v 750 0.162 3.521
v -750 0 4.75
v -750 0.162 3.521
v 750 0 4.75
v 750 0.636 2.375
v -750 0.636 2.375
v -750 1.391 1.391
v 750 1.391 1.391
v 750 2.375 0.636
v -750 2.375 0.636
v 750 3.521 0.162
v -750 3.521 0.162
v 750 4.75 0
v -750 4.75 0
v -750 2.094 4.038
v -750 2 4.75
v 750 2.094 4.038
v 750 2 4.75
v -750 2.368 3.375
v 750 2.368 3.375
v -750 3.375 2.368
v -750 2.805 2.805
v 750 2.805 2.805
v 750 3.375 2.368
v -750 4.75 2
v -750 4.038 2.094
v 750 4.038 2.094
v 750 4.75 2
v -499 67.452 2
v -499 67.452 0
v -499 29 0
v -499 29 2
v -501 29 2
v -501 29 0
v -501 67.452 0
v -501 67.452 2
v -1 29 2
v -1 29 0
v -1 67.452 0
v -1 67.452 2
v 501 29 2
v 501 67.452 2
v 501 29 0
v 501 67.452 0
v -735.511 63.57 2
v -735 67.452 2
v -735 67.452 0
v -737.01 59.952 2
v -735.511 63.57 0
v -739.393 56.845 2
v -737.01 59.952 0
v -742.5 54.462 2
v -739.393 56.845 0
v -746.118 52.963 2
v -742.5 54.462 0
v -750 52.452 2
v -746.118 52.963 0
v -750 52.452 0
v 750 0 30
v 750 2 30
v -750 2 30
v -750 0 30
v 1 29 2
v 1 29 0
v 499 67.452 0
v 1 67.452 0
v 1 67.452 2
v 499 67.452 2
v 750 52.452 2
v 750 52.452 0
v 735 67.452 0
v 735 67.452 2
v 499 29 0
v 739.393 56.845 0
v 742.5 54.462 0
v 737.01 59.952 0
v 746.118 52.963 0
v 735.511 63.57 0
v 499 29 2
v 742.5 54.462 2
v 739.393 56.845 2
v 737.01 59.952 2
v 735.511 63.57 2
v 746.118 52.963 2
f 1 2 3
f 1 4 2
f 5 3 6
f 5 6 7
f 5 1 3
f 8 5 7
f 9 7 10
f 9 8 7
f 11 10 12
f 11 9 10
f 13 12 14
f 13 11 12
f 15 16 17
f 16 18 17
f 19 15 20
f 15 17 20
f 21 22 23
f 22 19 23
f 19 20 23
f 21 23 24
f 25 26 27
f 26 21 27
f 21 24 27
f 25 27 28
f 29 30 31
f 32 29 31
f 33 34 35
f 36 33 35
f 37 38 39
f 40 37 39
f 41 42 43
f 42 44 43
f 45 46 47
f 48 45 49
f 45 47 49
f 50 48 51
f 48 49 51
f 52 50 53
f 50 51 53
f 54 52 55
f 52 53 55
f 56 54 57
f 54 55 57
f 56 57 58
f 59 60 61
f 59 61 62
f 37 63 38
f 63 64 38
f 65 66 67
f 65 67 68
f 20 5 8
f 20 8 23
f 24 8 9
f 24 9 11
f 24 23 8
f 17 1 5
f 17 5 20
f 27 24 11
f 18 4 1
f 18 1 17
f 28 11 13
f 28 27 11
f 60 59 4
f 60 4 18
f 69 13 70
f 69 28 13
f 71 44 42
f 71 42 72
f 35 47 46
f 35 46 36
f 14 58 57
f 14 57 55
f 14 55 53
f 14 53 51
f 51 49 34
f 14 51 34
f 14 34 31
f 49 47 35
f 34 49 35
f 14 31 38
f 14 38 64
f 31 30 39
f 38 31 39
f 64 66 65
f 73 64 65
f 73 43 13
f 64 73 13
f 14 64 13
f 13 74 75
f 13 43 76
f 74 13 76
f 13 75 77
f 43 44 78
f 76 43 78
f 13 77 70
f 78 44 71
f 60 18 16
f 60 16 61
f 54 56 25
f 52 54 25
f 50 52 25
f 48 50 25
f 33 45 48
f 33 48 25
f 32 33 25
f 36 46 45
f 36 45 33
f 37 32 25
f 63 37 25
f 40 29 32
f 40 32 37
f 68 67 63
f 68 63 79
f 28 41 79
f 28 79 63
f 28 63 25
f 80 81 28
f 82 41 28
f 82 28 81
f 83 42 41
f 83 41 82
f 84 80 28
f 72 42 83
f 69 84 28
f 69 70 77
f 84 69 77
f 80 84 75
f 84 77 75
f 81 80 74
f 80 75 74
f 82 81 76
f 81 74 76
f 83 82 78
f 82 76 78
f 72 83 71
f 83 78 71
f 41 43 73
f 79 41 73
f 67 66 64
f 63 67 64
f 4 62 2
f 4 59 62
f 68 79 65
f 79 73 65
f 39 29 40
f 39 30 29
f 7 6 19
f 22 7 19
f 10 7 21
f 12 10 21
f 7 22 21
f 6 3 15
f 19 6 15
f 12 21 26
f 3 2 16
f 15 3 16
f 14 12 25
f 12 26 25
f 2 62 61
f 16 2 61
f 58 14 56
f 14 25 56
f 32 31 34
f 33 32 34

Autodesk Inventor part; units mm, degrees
ref_plane "YZ Plane" through (0, 0, 0) normal (1, 0, 0) x (0, 1, 0)
ref_plane "XZ Plane" through (0, 0, 0) normal (0, 1, 0) x (-1, 0, 0)
ref_plane "XY Plane" through (0, 0, 0) normal (0, 0, 1) x (1, 0, 0)
sketch "Sketch1" plane through (0, 0, 0) normal (0, 0, 1) x (1, 0, 0)
  line L0 (-750, 67.4521) -> (750, 67.4521)
  line L1 (750, 67.4521) -> (750, 0)
  line L2 (750, 0) -> (-750, 0)
  line L3 (-750, 0) -> (-750, 67.4521)
  point P0 (0, 0)
  point P1 (0, 0)
  dimension "d0" = 1500
  dimension "d1" = 67.4521
extrude "Plate1" add sketch "Sketch1" along normal blind 2
sketch "Sketch2" plane through (750, 2, 0) normal (0, -1, 0) x (1, 0, 0)
  line L0 (-1500, 0) -> (0, 0)
  line L1 (0, 0) -> (0, 30)
  line L2 (0, 30) -> (-1500, 30)
  line L3 (-1500, 30) -> (-1500, 0)
edge flange "Flange1" height 30 angle 90 thickness 2 bend radius 2.75 thickness toward (0, -1, 0) relief round relief width 2 relief depth 1 edges at (0, 0, 2) wall of the first edge with corners at (-750, 2, 0) (750, 2, 0) (750, 2, 30) (-750, 2, 30)
bend "Bend1"
corner "Corner1"
sketch "Sketch5" plane through (0, 0, 0) normal (0, 0, -1) x (-1, 0, 0)
  line L0 (750, 67.4521) -> (-750, 67.4521) projected
  line L1 (499, 67.4521) -> (499, 29)
  line L2 (499, 29) -> (501, 29)
  line L3 (501, 29) -> (501, 67.4521)
  line L4 (750, 0) -> (-750, 0) projected
  point P0 (0, 0)
  point P1 (500, 29)
  dimension "d18" = 2
  dimension "d20" = 29
  dimension "d27" = 250
extrude "Extrusion1" cut sketch "Sketch5" against normal through all
pattern_linear "Rectangular Pattern1" count 3 spacing 500 along (1, 0, 0) of "Extrusion1"
sketch "Sketch6" plane through (0, 0, 0) normal (0, 0, -1) x (-1, 0, 0)
  line L0 (-750, 67.4521) -> (-750, 4.75) projected
  circle A0 centre (-750, 67.4521) radius 15
  line L1 (-750, 67.4521) -> (-501, 67.4521) projected
  point P0 (0, 0)
  point P1 (-735, 67.4521)
  point P2 (-750, 52.4521)
  dimension "d24" = 30
extrude "Extrusion2" cut sketch "Sketch6" against normal through all contours L1 A0 L0 picked at (-740.1254, 66.3395)
mirror "Mirror1" about plane through (0, 0, 0) normal (1, 0, 0) of "Extrusion2"
equation "\"d1\" = Стрингер_2"
equation "\"d18\" = Thickness"
equation "\"d2\" = Thickness"
equation "\"d3\" = BendReliefWidth"
equation "\"d4\" = BendReliefDepth"
equation "\"d5\" = MinimumRemnant"
equation "\"d6\" = TransitionRadius"
equation "\"d9\" = BendRadius"
equation "\"d10\" = CornerReliefSize"
equation "\"d11\" = GapSize"
equation "\"d12\" = JacobiRadiusSize"
equation "\"GapSize\" = Thickness"
equation "\"MinimumRemnant\" = 2 * Thickness"
equation "\"BendReliefDepth\" = 0.5 * Thickness"
equation "\"BendReliefWidth\" = Thickness"
equation "\"CornerReliefSize\" = 4 * Thickness"
equation "\"JacobiRadiusSize\" = BendRadius"
equation "\"TransitionRadius\" = BendRadius"
equation "\"qqqqqq\" = 67.35706"
equation "\"Стрингер_2\" = 67.452127"
equation "\"Thickness\" = 2"
equation "\"BendRadius\" = 2.75"
properties part number "МОО 052 стрингер спина 2" material "Stainless Steel"
